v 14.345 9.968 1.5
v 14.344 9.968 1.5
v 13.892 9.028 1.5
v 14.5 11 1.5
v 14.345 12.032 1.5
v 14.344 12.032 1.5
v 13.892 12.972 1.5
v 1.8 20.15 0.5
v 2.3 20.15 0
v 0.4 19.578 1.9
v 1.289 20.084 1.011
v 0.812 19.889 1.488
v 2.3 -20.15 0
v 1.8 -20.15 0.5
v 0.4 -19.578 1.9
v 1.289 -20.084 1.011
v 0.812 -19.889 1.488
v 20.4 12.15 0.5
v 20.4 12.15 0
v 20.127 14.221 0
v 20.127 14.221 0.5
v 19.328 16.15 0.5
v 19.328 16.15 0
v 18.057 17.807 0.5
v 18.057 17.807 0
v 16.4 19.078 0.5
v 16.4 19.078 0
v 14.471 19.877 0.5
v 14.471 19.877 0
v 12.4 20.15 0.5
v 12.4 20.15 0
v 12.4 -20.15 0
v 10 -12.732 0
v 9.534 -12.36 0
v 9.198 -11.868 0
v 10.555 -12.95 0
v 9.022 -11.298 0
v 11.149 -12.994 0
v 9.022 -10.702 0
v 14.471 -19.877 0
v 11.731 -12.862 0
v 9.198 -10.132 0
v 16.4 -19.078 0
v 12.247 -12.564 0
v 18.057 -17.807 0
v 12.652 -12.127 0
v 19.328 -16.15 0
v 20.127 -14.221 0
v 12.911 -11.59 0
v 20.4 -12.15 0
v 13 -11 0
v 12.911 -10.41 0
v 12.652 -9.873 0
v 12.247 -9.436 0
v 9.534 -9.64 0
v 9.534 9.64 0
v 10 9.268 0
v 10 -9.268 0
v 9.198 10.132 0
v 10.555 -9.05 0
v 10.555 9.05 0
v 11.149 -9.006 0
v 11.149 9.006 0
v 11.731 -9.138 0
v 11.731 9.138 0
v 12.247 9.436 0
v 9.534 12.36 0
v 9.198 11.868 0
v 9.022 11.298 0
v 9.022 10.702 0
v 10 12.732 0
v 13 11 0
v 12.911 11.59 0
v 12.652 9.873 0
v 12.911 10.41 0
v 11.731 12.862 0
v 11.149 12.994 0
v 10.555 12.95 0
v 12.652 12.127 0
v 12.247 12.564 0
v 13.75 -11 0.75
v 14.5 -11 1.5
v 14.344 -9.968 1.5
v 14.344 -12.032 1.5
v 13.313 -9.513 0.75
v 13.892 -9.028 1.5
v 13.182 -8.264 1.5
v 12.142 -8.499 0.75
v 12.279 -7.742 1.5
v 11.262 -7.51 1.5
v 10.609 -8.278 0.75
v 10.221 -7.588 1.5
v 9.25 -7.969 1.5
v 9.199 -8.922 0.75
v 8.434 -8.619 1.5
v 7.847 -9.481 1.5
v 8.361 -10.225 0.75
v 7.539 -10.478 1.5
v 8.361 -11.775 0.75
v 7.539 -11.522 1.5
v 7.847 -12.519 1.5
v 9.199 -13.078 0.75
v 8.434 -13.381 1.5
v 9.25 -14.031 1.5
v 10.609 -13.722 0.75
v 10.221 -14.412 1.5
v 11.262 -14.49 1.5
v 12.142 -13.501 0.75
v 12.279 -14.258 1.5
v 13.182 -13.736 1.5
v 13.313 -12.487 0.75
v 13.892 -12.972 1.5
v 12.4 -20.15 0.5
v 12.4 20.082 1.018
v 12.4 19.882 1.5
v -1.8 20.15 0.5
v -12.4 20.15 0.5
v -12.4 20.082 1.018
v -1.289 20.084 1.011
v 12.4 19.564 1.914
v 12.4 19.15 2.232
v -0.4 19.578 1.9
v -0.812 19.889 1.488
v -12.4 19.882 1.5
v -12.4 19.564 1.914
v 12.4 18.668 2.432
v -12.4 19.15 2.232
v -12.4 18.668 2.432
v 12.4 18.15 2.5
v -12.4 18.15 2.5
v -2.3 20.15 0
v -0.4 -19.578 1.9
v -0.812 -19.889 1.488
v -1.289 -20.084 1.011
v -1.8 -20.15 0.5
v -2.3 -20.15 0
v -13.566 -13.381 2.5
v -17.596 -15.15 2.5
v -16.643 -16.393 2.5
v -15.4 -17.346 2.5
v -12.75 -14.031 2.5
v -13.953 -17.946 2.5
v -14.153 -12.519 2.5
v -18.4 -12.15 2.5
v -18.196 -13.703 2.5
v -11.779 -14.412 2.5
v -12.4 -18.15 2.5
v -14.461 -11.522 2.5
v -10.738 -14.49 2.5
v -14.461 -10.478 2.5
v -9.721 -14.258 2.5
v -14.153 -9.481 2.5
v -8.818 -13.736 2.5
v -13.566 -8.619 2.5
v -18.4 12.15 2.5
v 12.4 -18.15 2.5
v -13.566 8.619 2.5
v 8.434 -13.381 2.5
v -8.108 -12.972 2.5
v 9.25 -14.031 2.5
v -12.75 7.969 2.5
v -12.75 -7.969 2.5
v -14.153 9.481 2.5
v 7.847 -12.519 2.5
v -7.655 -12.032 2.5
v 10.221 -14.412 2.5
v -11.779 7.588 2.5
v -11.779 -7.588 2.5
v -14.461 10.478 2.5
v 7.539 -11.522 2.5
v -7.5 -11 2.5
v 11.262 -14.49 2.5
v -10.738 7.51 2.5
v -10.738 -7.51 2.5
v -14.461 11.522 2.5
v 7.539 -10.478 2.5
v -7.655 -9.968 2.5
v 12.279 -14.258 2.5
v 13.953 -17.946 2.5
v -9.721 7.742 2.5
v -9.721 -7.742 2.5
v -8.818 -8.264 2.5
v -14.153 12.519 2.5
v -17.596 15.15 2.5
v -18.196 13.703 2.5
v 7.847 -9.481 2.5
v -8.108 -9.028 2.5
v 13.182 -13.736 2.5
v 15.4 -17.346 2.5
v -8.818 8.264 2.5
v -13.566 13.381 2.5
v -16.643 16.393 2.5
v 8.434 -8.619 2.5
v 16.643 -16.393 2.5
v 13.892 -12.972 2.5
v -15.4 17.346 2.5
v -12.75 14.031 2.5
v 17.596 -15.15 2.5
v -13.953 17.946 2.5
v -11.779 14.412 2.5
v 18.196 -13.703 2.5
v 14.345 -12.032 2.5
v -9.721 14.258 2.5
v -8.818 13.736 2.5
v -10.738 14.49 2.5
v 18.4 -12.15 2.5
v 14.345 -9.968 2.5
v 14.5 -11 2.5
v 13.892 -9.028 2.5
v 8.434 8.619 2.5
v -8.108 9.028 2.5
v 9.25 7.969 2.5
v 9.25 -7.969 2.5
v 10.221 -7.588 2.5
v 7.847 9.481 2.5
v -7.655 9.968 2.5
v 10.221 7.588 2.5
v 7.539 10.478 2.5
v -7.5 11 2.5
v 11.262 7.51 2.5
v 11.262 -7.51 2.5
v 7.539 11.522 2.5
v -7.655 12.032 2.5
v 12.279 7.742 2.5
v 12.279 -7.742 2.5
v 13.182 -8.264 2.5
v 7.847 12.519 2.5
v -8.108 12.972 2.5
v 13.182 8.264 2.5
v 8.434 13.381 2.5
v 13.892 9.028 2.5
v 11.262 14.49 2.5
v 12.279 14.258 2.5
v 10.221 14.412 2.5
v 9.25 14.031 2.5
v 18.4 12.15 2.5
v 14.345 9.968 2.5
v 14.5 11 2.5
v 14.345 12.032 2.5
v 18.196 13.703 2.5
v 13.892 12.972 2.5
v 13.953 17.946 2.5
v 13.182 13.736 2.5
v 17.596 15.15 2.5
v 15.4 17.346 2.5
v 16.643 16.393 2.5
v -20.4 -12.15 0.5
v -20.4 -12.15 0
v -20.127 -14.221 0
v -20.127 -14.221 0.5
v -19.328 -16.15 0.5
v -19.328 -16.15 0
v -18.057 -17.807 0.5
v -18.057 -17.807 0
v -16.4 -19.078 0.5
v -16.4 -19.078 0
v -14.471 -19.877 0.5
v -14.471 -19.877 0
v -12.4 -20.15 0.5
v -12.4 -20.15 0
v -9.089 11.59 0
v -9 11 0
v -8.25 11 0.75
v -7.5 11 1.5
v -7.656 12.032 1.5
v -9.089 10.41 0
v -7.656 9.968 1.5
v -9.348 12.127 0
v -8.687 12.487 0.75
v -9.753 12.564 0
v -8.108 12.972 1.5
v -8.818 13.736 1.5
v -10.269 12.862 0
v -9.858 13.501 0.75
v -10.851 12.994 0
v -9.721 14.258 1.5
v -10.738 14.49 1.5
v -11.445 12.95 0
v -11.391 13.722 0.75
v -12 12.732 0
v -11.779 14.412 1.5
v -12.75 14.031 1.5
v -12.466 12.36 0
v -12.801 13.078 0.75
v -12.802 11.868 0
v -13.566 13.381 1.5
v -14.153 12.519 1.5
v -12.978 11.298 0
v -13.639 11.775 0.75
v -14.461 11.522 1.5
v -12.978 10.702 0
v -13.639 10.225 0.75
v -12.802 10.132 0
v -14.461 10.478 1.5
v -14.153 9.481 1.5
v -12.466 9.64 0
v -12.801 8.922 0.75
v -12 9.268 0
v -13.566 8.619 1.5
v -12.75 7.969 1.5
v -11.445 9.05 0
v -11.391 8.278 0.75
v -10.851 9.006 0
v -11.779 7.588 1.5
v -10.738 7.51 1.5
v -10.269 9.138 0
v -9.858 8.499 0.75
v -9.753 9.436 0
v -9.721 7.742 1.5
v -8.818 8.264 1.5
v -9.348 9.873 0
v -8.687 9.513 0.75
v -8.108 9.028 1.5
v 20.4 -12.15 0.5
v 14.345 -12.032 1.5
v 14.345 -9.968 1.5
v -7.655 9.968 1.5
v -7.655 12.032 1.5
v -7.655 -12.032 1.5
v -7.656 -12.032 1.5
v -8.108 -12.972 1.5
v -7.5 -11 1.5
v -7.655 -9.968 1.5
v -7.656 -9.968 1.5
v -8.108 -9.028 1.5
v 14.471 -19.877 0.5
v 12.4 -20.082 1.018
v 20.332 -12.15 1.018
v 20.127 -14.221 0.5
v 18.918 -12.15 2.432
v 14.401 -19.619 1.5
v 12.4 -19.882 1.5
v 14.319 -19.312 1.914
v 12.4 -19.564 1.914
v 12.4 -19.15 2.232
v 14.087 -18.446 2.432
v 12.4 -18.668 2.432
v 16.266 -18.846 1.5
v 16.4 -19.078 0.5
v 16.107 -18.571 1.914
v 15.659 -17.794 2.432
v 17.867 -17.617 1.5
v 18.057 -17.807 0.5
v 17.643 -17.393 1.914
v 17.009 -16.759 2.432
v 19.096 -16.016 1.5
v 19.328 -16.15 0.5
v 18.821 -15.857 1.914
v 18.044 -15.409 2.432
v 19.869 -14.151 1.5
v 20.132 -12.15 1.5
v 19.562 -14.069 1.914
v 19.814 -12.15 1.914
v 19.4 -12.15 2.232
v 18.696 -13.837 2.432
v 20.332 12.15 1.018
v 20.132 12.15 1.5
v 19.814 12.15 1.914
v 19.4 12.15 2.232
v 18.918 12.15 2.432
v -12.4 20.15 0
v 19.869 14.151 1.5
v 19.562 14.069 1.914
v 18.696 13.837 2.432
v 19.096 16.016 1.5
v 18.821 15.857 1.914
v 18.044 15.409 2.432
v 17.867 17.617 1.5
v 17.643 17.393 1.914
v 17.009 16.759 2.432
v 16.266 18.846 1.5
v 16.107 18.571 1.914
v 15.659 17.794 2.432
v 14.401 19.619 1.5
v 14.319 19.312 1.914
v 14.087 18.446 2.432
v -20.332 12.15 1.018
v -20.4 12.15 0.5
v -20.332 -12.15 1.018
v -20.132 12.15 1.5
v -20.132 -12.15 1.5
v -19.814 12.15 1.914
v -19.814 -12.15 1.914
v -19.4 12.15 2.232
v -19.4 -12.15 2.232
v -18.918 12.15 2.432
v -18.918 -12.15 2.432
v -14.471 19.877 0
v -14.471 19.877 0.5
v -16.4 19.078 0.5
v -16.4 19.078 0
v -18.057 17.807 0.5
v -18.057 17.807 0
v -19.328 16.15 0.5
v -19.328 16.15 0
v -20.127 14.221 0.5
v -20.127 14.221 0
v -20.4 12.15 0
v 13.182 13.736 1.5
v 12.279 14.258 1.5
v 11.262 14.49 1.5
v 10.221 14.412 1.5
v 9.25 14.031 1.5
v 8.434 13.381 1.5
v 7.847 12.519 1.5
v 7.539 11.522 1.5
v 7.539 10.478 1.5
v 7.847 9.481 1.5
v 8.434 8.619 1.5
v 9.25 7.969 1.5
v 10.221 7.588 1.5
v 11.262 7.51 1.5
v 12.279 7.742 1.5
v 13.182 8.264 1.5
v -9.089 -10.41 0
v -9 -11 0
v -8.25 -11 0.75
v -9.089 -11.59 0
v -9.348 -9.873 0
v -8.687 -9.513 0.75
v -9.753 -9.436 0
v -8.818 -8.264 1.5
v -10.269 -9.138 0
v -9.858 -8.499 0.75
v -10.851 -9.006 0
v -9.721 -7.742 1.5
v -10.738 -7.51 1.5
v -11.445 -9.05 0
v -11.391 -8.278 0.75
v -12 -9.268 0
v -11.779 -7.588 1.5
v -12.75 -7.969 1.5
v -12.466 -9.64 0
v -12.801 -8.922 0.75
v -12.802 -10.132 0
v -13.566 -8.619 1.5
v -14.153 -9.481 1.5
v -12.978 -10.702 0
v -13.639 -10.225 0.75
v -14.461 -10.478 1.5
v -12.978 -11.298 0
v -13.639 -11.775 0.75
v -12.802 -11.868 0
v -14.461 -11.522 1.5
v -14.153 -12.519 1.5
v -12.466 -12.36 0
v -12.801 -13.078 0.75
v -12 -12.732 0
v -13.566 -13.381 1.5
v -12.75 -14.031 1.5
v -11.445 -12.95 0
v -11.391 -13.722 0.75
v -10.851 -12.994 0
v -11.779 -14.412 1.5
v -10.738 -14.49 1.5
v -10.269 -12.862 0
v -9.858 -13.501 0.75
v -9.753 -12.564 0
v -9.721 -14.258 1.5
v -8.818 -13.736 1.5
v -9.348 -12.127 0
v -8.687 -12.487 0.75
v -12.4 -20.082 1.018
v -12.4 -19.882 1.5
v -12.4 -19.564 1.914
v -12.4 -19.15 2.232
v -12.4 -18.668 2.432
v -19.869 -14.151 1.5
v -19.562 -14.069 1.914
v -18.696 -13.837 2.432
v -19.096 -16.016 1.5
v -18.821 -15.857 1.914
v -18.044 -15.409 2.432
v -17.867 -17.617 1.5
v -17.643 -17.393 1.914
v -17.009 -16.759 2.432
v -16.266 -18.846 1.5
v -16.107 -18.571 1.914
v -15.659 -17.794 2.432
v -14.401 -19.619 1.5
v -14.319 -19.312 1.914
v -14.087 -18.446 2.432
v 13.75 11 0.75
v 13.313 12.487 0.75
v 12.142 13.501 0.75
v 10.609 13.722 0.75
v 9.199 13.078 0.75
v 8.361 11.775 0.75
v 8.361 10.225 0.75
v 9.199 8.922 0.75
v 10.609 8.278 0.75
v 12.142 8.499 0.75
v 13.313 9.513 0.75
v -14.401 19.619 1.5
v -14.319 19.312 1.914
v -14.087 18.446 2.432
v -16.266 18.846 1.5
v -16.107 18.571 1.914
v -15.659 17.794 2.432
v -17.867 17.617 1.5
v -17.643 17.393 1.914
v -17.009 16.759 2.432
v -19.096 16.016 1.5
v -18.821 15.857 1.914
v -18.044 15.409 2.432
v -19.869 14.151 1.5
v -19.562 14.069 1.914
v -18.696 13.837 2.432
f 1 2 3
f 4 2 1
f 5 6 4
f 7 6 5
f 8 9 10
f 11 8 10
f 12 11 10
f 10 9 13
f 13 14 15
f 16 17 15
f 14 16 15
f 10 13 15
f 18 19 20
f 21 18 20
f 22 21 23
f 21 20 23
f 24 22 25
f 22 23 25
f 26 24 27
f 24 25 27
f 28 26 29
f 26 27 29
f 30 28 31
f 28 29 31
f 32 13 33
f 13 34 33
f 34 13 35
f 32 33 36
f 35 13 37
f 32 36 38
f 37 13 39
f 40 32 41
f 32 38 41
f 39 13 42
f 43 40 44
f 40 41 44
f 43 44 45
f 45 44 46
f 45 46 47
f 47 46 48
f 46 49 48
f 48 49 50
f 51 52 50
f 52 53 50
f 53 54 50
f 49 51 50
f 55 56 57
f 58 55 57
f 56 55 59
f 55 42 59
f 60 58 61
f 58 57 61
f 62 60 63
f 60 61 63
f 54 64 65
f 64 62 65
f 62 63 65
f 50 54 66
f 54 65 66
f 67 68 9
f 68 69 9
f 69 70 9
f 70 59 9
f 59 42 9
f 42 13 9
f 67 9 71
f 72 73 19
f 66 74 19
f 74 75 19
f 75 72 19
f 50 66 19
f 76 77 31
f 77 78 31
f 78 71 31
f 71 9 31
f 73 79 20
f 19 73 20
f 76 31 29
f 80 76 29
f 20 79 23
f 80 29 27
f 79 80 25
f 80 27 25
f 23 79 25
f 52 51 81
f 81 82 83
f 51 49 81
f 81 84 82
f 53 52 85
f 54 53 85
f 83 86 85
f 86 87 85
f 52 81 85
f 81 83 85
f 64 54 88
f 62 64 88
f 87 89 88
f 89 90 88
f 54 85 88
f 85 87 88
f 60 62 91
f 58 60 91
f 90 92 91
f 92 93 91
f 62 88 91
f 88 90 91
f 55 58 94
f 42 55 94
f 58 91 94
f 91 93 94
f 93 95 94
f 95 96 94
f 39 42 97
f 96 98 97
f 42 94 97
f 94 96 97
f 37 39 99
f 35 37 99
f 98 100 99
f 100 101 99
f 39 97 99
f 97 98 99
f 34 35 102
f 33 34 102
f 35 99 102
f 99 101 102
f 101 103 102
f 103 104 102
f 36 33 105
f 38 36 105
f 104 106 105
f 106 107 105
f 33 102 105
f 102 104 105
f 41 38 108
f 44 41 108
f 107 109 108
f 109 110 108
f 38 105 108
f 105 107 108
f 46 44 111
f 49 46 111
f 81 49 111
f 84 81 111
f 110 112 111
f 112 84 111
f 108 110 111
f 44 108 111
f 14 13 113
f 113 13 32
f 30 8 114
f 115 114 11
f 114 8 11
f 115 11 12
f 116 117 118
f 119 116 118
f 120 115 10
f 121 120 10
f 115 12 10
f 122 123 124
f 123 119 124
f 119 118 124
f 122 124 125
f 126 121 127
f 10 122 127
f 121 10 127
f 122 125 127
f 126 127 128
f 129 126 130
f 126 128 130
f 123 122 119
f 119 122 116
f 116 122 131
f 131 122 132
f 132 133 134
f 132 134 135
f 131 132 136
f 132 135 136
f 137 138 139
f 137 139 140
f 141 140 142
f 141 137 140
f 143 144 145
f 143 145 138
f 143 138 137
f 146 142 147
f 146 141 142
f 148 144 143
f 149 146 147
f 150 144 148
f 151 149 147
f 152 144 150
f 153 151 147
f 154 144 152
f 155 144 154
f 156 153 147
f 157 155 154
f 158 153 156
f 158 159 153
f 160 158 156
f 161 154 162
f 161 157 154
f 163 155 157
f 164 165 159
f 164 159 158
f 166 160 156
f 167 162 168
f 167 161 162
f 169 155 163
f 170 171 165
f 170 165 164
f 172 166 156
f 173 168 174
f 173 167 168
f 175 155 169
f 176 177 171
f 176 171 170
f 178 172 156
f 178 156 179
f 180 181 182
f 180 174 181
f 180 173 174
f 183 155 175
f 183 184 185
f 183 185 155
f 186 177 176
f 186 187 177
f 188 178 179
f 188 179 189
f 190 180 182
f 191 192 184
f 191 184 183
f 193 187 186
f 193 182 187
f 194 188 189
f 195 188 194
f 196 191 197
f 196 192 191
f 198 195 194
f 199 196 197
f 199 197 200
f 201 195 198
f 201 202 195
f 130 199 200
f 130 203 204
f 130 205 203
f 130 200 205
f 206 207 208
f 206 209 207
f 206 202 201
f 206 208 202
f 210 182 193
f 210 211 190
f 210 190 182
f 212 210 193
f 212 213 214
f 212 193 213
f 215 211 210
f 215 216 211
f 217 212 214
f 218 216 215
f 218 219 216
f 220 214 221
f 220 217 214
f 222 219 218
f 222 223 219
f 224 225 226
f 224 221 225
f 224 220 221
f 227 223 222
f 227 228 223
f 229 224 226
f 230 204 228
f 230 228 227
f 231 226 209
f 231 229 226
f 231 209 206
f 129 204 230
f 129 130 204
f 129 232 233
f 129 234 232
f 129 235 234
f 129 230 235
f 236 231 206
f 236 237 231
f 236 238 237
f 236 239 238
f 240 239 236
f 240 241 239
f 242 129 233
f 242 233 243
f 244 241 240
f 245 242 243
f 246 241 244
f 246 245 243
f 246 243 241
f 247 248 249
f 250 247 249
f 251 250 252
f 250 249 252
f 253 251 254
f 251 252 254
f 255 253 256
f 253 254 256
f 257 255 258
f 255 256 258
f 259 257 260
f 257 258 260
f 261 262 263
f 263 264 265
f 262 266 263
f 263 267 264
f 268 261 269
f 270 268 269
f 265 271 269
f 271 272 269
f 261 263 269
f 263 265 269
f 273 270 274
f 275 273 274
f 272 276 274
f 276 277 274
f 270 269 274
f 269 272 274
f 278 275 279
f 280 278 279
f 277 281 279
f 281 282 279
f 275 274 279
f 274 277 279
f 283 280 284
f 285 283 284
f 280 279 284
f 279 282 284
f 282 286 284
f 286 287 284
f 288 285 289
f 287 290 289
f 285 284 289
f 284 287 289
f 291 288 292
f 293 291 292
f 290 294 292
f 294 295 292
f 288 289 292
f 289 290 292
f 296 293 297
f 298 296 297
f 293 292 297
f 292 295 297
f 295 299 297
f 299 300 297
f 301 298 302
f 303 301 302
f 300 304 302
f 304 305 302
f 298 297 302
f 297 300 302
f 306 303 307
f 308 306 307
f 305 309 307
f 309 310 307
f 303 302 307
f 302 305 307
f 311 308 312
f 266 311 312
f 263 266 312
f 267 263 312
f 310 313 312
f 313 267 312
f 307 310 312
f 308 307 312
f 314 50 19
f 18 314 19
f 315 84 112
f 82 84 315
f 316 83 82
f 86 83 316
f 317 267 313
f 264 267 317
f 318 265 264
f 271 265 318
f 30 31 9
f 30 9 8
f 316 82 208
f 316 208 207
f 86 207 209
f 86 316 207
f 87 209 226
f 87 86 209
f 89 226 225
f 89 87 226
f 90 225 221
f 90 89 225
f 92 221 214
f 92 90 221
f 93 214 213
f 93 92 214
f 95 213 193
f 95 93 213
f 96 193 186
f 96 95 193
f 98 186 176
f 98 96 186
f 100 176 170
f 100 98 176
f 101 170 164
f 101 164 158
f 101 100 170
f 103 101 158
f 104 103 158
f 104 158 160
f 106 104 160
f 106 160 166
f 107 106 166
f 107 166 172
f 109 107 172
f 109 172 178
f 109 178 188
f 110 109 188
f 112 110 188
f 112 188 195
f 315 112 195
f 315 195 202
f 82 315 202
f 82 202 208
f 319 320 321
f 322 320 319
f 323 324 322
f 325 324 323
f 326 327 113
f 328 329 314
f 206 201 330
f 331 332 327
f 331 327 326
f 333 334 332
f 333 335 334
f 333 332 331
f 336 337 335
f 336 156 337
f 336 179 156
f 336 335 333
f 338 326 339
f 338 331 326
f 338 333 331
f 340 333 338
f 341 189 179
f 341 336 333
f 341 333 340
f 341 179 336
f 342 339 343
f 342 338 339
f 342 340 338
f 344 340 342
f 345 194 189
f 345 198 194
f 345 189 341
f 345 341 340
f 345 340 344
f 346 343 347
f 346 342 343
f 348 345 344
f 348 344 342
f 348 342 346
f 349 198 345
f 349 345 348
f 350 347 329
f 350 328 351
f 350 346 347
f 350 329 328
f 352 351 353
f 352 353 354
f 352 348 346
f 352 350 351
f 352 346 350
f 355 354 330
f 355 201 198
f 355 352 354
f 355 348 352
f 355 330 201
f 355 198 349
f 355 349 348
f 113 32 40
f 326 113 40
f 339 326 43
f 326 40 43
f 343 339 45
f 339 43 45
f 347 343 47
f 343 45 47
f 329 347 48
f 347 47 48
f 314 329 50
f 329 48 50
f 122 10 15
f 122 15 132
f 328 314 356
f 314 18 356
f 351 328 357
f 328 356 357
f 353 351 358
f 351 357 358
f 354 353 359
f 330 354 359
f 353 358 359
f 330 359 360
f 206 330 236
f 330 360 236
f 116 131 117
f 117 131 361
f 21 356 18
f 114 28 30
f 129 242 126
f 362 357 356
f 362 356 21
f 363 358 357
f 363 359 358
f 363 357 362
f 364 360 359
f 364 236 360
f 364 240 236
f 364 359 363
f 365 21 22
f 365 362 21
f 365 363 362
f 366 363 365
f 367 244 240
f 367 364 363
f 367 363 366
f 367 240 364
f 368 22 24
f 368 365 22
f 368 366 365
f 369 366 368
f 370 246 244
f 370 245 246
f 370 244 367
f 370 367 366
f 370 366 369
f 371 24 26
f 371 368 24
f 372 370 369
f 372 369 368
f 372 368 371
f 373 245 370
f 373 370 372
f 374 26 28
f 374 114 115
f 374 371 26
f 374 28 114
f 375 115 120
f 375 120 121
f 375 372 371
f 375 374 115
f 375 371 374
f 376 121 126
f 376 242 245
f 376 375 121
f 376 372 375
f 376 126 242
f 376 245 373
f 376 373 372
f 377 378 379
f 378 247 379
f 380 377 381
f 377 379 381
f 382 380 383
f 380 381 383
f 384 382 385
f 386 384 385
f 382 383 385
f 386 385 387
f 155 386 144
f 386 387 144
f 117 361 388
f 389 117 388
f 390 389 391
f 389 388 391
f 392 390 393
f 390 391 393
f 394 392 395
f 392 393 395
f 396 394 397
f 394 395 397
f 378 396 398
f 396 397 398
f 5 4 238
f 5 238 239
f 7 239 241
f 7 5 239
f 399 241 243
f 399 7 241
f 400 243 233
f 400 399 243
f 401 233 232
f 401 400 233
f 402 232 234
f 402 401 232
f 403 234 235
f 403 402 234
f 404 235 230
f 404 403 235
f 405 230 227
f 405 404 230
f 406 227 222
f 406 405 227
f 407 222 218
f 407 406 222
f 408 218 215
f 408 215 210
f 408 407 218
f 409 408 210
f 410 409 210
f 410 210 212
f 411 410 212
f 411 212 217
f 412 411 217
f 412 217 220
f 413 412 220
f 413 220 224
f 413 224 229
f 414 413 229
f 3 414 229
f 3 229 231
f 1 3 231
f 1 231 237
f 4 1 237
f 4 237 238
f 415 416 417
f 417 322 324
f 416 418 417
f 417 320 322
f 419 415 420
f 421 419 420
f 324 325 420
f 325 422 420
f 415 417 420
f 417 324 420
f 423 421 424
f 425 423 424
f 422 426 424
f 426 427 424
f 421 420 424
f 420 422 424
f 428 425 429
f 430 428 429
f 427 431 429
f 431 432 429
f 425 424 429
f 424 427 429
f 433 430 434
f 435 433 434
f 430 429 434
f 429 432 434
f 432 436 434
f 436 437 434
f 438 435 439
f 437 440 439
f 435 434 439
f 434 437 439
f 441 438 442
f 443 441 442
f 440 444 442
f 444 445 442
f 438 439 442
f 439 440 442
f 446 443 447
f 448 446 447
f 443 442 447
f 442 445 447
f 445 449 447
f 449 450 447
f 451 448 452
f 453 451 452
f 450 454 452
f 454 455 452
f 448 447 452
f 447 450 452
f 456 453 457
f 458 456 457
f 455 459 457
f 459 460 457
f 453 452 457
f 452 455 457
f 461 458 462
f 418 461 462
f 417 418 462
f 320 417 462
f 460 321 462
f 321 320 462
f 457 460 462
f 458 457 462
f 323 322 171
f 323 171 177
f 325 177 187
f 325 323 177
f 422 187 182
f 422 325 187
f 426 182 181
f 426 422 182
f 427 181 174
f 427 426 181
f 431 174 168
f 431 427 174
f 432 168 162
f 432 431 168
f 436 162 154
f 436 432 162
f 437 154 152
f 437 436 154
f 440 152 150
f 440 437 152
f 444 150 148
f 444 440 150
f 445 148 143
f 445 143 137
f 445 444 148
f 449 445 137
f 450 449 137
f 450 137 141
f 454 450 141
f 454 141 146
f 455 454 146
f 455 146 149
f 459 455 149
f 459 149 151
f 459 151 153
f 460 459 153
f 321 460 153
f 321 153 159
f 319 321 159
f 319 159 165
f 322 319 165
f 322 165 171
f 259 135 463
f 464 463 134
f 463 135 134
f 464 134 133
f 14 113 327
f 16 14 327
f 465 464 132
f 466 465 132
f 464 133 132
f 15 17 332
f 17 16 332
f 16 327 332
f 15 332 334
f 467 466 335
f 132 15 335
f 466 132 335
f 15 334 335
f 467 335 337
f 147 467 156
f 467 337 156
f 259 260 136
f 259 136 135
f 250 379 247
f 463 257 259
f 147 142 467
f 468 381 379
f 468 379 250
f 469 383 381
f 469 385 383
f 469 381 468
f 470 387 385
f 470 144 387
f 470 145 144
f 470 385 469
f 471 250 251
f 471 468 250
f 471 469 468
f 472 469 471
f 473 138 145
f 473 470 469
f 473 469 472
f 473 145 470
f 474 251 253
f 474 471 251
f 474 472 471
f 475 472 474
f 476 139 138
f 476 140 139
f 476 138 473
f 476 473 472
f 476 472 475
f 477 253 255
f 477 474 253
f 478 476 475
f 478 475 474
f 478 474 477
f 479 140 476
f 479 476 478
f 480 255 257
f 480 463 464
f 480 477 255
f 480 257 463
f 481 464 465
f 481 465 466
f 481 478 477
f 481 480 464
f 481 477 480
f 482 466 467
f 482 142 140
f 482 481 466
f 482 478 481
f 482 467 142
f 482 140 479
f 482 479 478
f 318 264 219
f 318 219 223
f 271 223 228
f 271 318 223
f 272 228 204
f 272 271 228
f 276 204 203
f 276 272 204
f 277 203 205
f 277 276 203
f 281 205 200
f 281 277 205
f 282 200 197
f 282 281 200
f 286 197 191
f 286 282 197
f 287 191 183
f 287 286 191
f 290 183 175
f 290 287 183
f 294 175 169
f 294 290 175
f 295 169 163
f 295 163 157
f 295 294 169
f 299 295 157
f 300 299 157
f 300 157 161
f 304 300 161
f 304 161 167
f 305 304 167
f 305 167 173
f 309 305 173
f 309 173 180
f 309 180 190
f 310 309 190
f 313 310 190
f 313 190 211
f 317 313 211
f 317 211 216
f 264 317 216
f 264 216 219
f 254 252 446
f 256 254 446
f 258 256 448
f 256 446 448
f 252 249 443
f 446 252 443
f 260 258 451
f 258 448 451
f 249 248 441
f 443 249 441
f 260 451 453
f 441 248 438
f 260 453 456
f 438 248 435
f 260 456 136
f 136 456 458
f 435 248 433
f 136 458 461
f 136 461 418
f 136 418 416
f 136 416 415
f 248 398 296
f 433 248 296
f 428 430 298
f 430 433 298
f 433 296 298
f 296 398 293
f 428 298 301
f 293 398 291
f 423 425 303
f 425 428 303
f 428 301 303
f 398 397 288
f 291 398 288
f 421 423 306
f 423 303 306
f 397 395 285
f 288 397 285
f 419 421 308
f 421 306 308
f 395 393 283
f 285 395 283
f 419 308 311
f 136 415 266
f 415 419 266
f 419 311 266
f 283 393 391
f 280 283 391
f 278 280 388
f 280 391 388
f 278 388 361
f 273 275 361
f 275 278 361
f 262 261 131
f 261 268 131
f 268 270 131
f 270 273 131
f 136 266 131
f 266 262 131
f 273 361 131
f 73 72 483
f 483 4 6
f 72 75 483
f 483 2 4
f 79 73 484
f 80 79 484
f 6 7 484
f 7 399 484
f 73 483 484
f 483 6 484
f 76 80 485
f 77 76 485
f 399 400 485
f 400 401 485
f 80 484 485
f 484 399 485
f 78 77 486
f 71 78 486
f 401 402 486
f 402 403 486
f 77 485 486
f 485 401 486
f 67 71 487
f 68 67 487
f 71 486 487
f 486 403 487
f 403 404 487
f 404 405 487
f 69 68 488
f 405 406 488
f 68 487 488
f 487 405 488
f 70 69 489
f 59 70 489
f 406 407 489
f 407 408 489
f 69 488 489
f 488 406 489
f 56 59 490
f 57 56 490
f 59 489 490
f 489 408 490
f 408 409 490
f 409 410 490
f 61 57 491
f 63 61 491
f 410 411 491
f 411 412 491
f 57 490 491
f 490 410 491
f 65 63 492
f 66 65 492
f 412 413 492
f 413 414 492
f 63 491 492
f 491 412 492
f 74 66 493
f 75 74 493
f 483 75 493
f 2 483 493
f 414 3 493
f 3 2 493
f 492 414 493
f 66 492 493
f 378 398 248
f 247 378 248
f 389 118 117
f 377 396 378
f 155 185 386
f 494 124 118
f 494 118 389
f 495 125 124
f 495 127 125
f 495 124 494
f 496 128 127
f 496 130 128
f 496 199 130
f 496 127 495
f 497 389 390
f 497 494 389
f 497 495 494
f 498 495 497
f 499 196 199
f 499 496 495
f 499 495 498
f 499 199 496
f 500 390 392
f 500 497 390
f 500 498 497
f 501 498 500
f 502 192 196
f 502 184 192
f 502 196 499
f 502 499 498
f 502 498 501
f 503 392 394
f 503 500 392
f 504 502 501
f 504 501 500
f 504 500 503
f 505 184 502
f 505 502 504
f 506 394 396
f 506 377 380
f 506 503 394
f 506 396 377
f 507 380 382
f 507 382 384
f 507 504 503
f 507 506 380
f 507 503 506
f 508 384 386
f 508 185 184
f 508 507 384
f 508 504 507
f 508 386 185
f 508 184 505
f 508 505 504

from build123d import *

# Parameters (mm, degrees)
F0_R     = 3.5
F0_R_2   = 2
F1_DEPTH = 1.5
F2_DEPTH = 2.5
F3_R     = 2
F4_SIZE  = 1.49999
F7_DEPTH = 40.301


# Not quite as in the source:
# - a fillet or chamfer is up to 0.001 mm smaller than in the source, because OpenCascade refuses the exact size


with BuildPart() as f1:
    # F0 (on Top) → F1 (new body)
    with BuildSketch(Plane.XY):
        with BuildLine():
            ThreePointArc((20.4, 12.15), (18.0568542495, 17.8068542495), (12.4, 20.15))
            Line((12.4, 20.15), (-12.4, 20.15))
            ThreePointArc((-12.4, 20.15), (-18.0568542495, 17.8068542495), (-20.4, 12.15))
            Line((-20.4, 12.15), (-20.4, -12.15))
            ThreePointArc((-20.4, -12.15), (-18.0568542495, -17.8068542495), (-12.4, -20.15))
            Line((-12.4, -20.15), (12.4, -20.15))
            ThreePointArc((12.4, -20.15), (18.0568542495, -17.8068542495), (20.4, -12.15))
            Line((20.4, -12.15), (20.4, 12.15))
        make_face()
        with Locations((-11, -11)):
            Circle(F0_R, mode=Mode.SUBTRACT)
        with Locations((11, -11)):
            Circle(F0_R, mode=Mode.SUBTRACT)
        with Locations((-11, 11)):
            Circle(F0_R, mode=Mode.SUBTRACT)
        with Locations((11, 11)):
            Circle(F0_R, mode=Mode.SUBTRACT)
        with Locations((-11, 11)):
            Circle(F0_R)
        with Locations((-11, 11)):
            Circle(F0_R_2, mode=Mode.SUBTRACT)
        with Locations((11, 11)):
            Circle(F0_R)
        with Locations((11, 11)):
            Circle(F0_R_2, mode=Mode.SUBTRACT)
        with Locations((11, -11)):
            Circle(F0_R)
        with Locations((11, -11)):
            Circle(F0_R_2, mode=Mode.SUBTRACT)
        with Locations((-11, -11)):
            Circle(F0_R)
        with Locations((-11, -11)):
            Circle(F0_R_2, mode=Mode.SUBTRACT)
    extrude(amount=F1_DEPTH)

    # F0 (on Top) → F2 (join)
    with BuildSketch(Plane.XY):
        with BuildLine():
            ThreePointArc((20.4, 12.15), (18.0568542495, 17.8068542495), (12.4, 20.15))
            Line((12.4, 20.15), (-12.4, 20.15))
            ThreePointArc((-12.4, 20.15), (-18.0568542495, 17.8068542495), (-20.4, 12.15))
            Line((-20.4, 12.15), (-20.4, -12.15))
            ThreePointArc((-20.4, -12.15), (-18.0568542495, -17.8068542495), (-12.4, -20.15))
            Line((-12.4, -20.15), (12.4, -20.15))
            ThreePointArc((12.4, -20.15), (18.0568542495, -17.8068542495), (20.4, -12.15))
            Line((20.4, -12.15), (20.4, 12.15))
        make_face()
        with Locations((-11, -11)):
            Circle(F0_R, mode=Mode.SUBTRACT)
        with Locations((11, -11)):
            Circle(F0_R, mode=Mode.SUBTRACT)
        with Locations((-11, 11)):
            Circle(F0_R, mode=Mode.SUBTRACT)
        with Locations((11, 11)):
            Circle(F0_R, mode=Mode.SUBTRACT)
    extrude(amount=F2_DEPTH)

    # F3
    f3_edges = [f1.edges().sort_by_distance(p)[0] for p in [
        (-18.056854, 17.806854, 2.5),
    ]]
    fillet(f3_edges, radius=F3_R)

    # F4 (size 1.5 in the source; OpenCascade refuses exactly that, so slightly less here)
    f4_edges = [f1.edges().sort_by_distance(p)[0] for p in [
        (-13, 11, 1.5),
        (9, 11, 1.5),
        (9, -11, 1.5),
        (-13, -11, 1.5),
    ]]
    chamfer(f4_edges, length=F4_SIZE)

    # F6 (on offset) → F7 (cut, through all)
    with BuildSketch(Plane.XZ.offset(20.15)):
        Polygon((-0.4, 1.9), (-2.3, 0), (2.3, 0), (0.4, 1.9), align=None)
    extrude(amount=-F7_DEPTH, mode=Mode.SUBTRACT)


solid = f1.part
